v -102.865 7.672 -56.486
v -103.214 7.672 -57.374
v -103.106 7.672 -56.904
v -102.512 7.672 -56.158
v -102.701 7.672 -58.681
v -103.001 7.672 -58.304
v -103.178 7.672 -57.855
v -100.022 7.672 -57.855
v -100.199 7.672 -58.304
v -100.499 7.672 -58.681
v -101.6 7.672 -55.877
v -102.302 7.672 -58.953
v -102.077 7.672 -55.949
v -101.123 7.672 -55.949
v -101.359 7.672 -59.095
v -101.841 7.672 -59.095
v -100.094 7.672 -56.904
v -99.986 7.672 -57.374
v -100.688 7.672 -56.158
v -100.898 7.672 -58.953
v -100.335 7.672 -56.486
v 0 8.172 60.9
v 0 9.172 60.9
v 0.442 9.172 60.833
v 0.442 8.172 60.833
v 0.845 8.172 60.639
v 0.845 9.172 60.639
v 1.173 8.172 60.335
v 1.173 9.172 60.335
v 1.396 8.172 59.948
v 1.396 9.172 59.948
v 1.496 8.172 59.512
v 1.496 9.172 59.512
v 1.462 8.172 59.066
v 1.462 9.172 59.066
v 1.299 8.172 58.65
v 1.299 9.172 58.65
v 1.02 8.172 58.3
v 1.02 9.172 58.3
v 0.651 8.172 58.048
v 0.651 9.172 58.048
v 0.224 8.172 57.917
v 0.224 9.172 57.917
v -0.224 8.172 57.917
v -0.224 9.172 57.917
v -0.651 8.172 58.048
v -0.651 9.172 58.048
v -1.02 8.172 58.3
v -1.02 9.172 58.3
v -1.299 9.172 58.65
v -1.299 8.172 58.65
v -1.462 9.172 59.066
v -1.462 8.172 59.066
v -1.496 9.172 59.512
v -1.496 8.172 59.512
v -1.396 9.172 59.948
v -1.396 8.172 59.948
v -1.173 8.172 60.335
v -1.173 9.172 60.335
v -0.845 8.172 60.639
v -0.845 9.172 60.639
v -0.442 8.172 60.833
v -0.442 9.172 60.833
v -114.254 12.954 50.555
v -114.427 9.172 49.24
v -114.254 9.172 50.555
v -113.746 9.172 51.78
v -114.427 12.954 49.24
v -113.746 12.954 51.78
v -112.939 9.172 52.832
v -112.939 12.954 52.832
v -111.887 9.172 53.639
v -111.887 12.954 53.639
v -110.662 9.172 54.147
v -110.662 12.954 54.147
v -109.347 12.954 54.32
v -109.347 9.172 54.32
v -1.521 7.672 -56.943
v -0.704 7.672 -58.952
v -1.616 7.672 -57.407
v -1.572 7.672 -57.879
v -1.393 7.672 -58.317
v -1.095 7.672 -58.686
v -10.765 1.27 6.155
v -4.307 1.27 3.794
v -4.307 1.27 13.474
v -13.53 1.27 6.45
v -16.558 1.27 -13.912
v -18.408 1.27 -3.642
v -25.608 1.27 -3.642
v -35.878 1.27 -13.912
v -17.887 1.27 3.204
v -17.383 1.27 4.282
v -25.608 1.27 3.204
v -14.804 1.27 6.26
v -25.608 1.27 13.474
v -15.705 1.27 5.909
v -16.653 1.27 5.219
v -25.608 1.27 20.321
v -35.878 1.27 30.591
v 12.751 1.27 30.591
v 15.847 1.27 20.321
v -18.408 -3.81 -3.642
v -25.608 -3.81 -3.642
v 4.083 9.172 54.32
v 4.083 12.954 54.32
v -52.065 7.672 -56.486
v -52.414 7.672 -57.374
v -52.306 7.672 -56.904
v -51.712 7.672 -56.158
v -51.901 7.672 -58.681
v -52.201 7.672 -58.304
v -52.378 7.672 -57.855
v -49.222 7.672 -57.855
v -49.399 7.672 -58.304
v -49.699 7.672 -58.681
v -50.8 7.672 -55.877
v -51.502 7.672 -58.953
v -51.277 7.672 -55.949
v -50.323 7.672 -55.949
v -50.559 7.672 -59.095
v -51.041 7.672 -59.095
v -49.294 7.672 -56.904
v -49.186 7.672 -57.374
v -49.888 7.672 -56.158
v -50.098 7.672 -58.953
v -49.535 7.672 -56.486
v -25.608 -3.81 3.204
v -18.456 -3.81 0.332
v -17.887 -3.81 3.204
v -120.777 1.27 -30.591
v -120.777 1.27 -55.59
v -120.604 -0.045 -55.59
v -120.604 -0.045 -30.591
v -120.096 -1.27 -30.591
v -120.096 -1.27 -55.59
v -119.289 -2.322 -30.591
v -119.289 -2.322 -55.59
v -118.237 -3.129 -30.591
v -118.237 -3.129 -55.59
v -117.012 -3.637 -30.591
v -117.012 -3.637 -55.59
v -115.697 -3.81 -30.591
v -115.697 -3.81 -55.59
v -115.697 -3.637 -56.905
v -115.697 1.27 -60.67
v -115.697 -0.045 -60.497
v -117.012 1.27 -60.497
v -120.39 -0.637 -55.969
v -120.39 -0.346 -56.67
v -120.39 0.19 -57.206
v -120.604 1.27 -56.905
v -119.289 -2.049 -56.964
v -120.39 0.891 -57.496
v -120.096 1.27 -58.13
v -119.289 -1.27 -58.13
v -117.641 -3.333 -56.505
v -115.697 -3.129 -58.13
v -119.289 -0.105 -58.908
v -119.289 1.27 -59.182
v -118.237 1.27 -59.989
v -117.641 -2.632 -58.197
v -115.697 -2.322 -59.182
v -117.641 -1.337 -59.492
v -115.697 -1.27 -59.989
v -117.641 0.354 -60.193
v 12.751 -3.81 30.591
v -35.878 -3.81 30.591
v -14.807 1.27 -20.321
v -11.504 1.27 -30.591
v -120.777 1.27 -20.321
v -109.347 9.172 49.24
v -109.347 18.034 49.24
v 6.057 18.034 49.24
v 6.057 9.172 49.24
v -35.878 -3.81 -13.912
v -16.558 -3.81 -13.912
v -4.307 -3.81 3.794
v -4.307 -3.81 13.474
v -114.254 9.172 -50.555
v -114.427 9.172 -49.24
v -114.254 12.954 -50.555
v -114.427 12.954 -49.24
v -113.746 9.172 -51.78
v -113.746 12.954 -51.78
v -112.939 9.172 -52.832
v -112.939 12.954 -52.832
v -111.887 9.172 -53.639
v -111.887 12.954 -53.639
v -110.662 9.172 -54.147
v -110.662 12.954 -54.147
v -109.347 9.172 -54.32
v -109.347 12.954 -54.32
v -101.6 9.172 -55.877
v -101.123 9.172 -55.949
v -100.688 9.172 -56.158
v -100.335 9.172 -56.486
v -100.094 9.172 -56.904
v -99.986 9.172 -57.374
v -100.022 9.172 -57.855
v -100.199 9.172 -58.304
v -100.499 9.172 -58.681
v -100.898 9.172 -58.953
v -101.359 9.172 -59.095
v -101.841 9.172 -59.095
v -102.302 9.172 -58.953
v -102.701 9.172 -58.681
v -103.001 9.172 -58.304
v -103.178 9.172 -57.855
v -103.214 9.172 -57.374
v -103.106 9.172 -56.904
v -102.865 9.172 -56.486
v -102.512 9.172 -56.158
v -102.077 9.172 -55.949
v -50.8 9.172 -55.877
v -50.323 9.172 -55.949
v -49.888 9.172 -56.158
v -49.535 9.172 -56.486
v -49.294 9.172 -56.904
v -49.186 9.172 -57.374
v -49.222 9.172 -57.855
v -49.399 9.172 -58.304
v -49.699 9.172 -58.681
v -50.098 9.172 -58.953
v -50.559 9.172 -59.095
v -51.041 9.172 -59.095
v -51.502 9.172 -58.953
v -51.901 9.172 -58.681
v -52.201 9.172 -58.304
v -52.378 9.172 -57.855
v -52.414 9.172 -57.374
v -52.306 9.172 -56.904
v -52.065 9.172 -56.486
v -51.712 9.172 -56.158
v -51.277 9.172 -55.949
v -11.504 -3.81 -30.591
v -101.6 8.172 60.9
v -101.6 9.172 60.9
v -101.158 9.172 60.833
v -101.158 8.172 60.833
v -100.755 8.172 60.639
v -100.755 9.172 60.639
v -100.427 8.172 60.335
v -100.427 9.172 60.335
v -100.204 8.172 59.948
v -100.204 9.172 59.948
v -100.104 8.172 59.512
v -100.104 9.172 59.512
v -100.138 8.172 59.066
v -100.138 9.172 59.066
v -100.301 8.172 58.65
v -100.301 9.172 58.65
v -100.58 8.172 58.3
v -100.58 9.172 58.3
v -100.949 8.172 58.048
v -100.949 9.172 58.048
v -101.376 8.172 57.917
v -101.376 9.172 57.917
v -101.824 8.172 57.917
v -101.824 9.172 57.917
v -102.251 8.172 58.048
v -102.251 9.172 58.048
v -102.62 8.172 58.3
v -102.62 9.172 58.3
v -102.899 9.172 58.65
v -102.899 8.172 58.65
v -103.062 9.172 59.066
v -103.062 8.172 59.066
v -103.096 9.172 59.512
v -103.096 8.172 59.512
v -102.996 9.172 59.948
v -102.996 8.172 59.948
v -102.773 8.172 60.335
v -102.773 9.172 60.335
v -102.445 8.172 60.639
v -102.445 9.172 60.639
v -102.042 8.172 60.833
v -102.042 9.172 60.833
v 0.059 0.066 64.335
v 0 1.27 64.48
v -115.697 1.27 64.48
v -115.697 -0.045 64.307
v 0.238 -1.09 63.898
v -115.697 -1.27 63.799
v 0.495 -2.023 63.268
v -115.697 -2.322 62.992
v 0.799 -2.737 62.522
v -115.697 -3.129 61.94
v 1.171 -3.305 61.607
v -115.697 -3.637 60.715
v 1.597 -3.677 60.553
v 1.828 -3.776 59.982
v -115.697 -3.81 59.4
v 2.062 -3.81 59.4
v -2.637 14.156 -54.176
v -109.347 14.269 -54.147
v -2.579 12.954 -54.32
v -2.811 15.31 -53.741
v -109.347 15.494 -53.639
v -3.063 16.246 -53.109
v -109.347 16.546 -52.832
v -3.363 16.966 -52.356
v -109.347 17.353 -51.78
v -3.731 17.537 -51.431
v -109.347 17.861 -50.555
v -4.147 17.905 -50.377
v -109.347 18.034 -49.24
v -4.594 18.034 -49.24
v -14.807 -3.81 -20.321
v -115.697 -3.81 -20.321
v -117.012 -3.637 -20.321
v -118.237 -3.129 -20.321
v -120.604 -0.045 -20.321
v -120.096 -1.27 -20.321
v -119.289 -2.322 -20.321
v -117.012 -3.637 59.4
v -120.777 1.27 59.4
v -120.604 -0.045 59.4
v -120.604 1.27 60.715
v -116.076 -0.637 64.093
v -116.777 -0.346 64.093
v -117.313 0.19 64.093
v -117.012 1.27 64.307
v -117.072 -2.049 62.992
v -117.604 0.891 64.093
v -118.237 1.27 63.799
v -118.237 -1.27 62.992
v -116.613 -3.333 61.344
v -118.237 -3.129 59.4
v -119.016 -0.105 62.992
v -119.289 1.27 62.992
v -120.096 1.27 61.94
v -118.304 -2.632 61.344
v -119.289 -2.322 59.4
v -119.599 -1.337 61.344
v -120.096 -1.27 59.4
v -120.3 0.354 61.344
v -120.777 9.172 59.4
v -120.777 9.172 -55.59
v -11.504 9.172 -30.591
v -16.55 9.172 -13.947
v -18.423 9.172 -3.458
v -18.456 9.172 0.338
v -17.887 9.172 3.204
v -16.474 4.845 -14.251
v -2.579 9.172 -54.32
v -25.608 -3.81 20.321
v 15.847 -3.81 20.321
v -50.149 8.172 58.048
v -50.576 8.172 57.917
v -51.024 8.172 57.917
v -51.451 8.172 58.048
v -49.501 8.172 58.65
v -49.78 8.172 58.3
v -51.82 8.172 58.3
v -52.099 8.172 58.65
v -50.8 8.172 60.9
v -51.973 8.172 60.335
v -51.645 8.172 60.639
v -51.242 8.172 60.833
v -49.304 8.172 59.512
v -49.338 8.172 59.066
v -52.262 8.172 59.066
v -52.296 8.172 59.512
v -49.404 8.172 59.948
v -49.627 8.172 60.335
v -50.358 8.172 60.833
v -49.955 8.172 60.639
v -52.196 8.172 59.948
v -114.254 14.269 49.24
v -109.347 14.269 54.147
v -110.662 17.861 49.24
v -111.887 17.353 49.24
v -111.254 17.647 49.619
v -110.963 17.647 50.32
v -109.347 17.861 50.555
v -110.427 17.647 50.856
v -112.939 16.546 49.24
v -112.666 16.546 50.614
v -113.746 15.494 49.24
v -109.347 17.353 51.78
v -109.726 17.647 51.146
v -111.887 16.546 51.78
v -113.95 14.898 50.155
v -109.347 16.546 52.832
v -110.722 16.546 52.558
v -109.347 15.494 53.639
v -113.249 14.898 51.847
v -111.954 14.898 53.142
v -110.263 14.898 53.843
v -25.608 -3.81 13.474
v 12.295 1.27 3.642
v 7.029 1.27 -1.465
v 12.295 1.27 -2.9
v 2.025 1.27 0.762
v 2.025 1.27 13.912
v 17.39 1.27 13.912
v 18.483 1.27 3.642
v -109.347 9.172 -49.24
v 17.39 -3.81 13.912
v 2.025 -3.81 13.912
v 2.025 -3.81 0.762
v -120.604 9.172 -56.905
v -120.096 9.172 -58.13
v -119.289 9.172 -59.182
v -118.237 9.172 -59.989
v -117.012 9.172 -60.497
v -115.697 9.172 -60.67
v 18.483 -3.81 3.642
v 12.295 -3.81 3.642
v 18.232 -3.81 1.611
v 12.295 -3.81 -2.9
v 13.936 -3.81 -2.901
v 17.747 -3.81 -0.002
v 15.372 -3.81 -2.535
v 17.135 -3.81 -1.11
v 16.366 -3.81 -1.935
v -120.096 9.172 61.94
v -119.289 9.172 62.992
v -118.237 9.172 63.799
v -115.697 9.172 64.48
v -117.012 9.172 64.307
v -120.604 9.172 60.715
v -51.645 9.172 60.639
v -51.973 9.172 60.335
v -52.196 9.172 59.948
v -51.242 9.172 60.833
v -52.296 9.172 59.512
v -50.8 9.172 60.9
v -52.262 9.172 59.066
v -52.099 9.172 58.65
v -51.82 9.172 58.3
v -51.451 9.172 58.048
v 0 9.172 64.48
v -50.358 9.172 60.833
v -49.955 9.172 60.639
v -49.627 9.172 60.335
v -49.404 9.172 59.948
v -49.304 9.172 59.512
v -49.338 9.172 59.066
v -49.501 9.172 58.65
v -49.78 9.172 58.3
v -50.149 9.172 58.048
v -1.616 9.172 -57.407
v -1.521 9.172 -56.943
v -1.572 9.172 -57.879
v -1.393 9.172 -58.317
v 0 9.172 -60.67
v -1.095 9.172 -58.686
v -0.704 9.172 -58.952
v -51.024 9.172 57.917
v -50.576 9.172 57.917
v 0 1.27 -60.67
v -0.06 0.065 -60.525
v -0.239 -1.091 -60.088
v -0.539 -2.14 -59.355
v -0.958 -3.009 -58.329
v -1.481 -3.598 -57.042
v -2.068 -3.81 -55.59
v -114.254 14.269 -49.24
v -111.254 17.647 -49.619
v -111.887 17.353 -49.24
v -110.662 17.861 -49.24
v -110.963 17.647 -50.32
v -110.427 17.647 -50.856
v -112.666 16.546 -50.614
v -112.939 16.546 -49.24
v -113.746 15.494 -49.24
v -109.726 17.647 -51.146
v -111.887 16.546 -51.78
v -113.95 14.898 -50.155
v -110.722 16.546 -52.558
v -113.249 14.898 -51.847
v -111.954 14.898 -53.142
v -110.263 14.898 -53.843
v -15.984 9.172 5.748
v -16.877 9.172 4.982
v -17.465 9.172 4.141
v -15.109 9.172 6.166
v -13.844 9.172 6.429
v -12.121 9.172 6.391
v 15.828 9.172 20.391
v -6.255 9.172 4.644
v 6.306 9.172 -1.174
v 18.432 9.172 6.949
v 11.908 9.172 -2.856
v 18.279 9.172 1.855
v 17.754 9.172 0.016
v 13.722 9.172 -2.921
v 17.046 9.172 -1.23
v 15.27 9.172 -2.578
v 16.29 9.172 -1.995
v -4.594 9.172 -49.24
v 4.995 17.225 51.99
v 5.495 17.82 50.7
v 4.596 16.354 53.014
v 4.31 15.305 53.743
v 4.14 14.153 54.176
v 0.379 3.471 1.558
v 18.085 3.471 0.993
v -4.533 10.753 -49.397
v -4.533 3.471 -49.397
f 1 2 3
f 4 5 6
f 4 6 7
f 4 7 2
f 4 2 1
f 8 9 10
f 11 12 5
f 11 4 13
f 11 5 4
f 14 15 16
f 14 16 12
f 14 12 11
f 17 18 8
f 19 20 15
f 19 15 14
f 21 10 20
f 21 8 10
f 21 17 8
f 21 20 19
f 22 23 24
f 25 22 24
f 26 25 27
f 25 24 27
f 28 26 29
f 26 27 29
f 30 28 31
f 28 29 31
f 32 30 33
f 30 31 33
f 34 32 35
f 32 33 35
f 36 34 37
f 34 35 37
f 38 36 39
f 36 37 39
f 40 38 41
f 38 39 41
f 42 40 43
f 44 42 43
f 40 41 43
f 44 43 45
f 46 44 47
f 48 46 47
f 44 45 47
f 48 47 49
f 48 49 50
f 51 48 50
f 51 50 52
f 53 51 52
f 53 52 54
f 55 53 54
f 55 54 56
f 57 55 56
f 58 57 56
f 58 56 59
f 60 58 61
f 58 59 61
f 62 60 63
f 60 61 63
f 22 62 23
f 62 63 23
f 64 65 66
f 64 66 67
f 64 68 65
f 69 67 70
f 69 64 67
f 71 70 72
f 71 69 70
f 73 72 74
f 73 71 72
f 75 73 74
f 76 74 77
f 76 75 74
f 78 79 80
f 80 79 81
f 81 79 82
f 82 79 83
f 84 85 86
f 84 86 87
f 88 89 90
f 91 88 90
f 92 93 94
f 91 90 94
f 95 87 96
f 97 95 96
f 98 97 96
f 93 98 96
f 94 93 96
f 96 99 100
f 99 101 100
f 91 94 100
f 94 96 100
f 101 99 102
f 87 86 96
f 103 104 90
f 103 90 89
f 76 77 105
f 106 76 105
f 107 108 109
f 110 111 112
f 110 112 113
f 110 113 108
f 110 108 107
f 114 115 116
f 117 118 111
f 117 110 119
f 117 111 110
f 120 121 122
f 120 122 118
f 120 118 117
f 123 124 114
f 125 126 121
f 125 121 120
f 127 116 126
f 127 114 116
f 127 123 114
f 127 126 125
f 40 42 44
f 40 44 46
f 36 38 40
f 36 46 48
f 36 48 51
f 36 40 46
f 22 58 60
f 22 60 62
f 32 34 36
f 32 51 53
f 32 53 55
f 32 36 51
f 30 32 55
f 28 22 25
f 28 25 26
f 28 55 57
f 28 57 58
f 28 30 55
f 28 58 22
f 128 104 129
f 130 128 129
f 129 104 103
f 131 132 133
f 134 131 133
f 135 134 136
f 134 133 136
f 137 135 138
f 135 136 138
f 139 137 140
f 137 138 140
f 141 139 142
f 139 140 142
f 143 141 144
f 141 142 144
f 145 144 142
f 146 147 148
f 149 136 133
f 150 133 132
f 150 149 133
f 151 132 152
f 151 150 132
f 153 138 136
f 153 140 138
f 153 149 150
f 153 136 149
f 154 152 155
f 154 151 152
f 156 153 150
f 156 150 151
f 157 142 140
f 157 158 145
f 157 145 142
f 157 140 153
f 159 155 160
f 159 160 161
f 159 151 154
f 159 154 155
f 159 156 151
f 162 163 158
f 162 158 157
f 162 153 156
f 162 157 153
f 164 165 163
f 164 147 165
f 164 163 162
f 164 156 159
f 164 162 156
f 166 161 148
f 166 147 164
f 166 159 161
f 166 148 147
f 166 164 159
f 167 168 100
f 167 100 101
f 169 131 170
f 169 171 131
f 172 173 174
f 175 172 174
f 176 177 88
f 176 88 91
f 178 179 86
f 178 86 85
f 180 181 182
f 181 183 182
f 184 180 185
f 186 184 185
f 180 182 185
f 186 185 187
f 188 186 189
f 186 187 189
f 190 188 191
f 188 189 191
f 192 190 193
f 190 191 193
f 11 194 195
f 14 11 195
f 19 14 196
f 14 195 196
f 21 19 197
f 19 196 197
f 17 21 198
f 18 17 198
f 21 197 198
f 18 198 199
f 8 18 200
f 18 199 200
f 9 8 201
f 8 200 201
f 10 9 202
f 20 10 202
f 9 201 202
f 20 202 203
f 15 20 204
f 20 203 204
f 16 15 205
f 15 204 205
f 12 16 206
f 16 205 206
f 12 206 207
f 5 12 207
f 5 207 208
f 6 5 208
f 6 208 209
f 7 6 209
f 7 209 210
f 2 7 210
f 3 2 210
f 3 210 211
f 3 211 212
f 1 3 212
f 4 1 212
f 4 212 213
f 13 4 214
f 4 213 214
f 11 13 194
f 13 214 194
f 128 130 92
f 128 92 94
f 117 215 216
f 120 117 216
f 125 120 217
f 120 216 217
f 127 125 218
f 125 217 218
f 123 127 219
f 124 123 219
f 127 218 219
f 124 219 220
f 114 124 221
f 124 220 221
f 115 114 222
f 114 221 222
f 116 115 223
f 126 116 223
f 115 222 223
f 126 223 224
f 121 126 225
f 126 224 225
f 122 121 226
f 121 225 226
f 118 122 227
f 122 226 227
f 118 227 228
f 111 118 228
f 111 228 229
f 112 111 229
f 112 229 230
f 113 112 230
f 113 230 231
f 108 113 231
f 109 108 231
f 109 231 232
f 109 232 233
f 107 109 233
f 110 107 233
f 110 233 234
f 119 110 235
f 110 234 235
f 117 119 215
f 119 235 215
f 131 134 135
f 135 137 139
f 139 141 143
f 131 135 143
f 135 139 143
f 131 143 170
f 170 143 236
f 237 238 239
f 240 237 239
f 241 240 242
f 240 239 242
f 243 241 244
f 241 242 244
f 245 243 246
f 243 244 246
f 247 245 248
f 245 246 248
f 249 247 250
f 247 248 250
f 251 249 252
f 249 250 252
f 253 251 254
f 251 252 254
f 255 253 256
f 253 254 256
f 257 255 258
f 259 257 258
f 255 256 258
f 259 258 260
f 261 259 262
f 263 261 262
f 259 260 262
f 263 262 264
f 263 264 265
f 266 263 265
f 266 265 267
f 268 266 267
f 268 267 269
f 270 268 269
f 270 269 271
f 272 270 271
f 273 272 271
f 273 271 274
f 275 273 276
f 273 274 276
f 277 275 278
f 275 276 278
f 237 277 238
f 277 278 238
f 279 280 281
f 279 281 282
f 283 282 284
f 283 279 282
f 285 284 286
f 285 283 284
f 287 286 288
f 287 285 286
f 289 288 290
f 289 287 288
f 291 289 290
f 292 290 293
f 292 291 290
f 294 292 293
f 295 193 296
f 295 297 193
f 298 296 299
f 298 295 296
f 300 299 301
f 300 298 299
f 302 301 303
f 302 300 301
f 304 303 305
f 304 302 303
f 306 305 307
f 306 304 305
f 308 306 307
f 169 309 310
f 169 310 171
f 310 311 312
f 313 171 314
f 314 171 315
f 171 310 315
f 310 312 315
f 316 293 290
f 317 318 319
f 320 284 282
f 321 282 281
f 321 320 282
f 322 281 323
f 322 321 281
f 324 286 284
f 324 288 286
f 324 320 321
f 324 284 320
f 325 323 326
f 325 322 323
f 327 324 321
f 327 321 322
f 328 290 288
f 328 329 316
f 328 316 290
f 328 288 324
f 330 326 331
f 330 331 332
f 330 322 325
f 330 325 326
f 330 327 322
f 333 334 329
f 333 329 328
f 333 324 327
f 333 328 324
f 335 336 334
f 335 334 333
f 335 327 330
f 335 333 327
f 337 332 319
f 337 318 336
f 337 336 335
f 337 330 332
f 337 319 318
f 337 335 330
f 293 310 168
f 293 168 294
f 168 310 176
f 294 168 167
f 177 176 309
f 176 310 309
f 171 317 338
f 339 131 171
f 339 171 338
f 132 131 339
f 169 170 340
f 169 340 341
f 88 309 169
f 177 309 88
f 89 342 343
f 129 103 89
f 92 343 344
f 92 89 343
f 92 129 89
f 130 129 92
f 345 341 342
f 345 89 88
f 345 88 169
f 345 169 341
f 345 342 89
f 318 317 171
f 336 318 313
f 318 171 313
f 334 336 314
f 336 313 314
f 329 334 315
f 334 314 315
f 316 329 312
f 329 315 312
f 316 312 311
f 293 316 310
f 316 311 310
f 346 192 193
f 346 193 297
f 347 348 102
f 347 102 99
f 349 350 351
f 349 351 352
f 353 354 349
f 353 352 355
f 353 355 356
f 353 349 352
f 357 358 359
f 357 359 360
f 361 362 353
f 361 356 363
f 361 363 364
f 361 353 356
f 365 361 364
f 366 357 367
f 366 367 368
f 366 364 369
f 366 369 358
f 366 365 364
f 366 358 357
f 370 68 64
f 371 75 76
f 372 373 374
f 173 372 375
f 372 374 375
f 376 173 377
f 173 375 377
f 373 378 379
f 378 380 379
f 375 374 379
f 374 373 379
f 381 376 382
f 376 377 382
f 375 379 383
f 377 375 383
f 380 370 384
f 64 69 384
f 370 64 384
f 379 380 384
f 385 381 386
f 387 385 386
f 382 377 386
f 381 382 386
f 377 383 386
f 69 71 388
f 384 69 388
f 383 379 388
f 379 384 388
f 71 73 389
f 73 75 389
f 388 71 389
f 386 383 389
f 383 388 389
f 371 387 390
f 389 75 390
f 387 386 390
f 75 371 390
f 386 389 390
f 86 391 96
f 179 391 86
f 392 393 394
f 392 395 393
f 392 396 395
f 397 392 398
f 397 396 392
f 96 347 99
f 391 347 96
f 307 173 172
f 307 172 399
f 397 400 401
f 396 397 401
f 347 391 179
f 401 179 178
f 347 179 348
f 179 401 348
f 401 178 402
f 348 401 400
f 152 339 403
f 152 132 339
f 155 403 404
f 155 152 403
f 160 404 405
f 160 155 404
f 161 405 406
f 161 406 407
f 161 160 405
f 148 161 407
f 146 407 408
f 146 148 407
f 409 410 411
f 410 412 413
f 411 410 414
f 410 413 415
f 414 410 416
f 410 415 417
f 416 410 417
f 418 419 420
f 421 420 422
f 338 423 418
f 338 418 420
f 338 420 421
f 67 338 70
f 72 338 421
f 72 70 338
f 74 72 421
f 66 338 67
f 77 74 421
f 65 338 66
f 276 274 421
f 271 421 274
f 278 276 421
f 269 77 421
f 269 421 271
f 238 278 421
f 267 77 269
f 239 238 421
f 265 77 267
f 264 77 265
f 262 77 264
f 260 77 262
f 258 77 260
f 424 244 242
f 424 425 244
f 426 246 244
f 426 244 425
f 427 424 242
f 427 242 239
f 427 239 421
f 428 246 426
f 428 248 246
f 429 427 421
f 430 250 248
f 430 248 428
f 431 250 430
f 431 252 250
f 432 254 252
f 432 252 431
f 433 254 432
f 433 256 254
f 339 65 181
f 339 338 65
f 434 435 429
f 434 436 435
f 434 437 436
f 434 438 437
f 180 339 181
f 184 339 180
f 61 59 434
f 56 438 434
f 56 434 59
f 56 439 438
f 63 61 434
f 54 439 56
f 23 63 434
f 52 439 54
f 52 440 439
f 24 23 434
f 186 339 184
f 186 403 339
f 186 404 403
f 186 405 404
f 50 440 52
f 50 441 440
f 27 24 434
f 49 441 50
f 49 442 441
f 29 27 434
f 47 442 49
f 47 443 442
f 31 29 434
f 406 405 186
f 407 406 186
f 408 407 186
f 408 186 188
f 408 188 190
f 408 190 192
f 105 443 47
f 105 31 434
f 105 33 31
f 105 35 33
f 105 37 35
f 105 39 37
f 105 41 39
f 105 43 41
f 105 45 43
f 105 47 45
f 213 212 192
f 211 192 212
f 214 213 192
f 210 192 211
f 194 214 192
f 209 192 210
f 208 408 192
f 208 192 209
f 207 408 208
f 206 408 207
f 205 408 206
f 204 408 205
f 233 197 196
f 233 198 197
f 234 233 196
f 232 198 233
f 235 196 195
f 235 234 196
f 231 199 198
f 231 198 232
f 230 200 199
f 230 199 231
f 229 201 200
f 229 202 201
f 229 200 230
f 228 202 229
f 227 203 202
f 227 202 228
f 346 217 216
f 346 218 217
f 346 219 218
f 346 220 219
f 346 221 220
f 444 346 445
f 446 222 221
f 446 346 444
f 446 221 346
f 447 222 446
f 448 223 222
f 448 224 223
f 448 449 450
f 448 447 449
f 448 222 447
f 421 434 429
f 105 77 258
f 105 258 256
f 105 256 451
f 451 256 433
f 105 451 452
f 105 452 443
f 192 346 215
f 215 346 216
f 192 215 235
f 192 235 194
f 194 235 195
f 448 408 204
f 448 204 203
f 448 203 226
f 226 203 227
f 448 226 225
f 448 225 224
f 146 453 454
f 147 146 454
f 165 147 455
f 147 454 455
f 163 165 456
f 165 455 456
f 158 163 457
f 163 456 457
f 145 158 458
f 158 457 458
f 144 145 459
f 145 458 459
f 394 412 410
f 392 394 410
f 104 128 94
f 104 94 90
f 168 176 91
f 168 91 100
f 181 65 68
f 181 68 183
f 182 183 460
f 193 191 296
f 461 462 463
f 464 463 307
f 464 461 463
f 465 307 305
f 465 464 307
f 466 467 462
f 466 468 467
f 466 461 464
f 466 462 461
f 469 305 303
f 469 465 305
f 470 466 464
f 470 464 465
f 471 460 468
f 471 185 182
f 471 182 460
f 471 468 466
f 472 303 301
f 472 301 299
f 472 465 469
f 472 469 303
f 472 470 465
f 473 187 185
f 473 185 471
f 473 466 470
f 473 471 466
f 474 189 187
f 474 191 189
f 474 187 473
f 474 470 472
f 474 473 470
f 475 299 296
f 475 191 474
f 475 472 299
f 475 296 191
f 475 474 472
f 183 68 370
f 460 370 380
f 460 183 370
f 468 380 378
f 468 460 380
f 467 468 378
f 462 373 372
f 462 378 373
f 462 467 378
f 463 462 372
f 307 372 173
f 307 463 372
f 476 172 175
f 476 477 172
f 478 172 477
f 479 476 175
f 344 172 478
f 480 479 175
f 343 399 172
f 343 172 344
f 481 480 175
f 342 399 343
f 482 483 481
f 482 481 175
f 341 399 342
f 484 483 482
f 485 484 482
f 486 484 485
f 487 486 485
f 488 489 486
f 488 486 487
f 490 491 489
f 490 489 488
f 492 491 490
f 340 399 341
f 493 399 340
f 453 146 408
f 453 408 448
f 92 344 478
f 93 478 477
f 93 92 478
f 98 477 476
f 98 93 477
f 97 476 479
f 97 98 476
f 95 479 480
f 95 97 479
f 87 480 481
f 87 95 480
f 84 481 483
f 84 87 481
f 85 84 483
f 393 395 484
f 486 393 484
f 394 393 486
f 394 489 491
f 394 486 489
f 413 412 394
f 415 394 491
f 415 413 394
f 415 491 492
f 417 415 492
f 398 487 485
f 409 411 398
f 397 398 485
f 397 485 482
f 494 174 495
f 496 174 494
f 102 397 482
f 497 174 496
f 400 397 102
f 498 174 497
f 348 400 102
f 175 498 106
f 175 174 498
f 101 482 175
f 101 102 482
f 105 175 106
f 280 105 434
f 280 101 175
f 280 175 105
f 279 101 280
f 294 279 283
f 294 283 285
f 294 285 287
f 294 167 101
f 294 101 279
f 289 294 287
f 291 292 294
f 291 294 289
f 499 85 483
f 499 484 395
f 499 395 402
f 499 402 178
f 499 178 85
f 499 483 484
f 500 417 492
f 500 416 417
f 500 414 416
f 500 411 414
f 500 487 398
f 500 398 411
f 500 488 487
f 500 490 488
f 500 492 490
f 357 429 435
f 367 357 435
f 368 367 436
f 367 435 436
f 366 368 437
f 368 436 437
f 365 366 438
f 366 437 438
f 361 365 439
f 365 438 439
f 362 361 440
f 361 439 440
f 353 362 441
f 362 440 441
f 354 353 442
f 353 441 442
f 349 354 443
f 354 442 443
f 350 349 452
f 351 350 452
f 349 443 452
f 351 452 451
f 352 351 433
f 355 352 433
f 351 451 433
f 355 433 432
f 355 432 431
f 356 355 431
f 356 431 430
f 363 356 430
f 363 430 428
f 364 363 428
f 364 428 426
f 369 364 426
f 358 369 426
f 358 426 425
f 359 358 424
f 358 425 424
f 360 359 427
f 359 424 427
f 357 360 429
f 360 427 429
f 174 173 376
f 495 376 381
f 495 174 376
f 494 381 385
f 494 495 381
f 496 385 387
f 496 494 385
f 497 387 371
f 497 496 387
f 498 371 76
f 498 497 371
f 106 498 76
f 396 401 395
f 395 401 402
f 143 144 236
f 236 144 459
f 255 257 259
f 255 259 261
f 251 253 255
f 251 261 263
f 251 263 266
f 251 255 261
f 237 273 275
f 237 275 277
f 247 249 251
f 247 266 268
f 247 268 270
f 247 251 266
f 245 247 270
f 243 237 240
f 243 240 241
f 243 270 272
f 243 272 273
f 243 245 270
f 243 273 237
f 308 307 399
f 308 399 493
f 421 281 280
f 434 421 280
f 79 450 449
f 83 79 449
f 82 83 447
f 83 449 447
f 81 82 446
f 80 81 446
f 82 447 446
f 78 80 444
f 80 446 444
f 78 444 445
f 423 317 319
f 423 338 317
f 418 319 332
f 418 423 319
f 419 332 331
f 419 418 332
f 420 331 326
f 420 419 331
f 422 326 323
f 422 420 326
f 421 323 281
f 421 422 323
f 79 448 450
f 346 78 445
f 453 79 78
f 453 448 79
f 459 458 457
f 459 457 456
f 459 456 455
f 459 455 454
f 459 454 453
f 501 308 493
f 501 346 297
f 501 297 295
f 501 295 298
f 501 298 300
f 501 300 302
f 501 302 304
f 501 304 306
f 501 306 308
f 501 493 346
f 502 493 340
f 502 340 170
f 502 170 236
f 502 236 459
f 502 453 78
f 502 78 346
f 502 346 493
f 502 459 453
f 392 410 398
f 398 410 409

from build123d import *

# Parameters (mm, degrees)
SKETCH1_14_W         = 241.554
SKETCH1_14_H         = 125.149549896
BOSS_EXTRUDE9_DEPTH  = 3.81
SKETCH1_W            = 241.554
SKETCH1_H            = 125.149549896
SKETCH1_W_2          = 228.854
SKETCH1_H_2          = 108.639549896
BOSS_EXTRUDE10_DEPTH = 9.171821007
SKETCH29_R           = 1.61811024
CUT_EXTRUDE12_DEPTH  = 1.5
LPATTERN24_COUNT     = 3
LPATTERN24_PITCH     = 50.8
LPATTERN25_COUNT     = 3
LPATTERN25_PITCH     = 50.8
SKETCH30_R           = 1.5
CUT_EXTRUDE13_DEPTH  = 1
LPATTERN26_COUNT     = 3
LPATTERN26_PITCH     = 50.8
LPATTERN27_COUNT     = 3
LPATTERN27_PITCH     = 50.8
SKETCH37_W           = 228.854
SKETCH37_H           = 108.639549896
BOSS_EXTRUDE12_DEPTH = 18.034
FILLET7_R            = 5.08
SKETCH38_W           = 218.694
SKETCH38_H           = 98.479549896
CUT_EXTRUDE14_DEPTH  = 8.862178993
CUT_EXTRUDE15_DEPTH  = 5.08
SURFACECUT1_START    = -3.81
SURFACECUT1_DEPTH    = 21.844


# Read off the part's stored shape, not the designer's step: SurfaceCut1
with BuildPart() as part:
    # Sketch1<14> → Boss-Extrude9 (new body)
    with BuildSketch(Plane(origin=(0, 0, 0), x_dir=(1, 0, 0), z_dir=(0, 1, 0))):
        with Locations((0, -1.905)):
            Rectangle(SKETCH1_14_W, SKETCH1_14_H)
    extrude(amount=-BOSS_EXTRUDE9_DEPTH)

    # Sketch1 → Boss-Extrude10 (add)
    with BuildSketch(Plane(origin=(0, 0, 0), x_dir=(1, 0, 0), z_dir=(0, 1, 0))):
        with Locations((0, -1.905)):
            Rectangle(SKETCH1_W, SKETCH1_H)
        Rectangle(SKETCH1_W_2, SKETCH1_H_2, mode=Mode.SUBTRACT)
    extrude(amount=BOSS_EXTRUDE10_DEPTH)

    # Sketch29 → Cut-Extrude12 (cut)
    with BuildSketch(Plane(origin=(0, 9.171821007, 0), x_dir=(1, 0, 0), z_dir=(0, 1, 0))):
        with Locations(Location((0, 57.494774948, 0), (0, 0, 270))):
            Circle(SKETCH29_R)
    cut_extrude12 = extrude(amount=-CUT_EXTRUDE12_DEPTH, mode=Mode.SUBTRACT)

    # LPattern24: Cut-Extrude12 ×3
    with Locations(*[(-i * LPATTERN24_PITCH, 0, 0) for i in range(1, LPATTERN24_COUNT)]):
        add(cut_extrude12, mode=Mode.SUBTRACT)

    # LPattern25: Cut-Extrude12 ×3
    with Locations(*[(i * LPATTERN25_PITCH, 0, 0) for i in range(1, LPATTERN25_COUNT)]):
        add(cut_extrude12, mode=Mode.SUBTRACT)

    # Sketch30 → Cut-Extrude13 (cut)
    with BuildSketch(Plane(origin=(0, 9.171821007, 0), x_dir=(1, 0, 0), z_dir=(0, 1, 0))):
        with Locations(Location((0, -59.399774948, 0), (0, 0, 270))):
            Circle(SKETCH30_R)
    cut_extrude13 = extrude(amount=-CUT_EXTRUDE13_DEPTH, mode=Mode.SUBTRACT)

    # LPattern26: Cut-Extrude13 ×3
    with Locations(*[(i * LPATTERN26_PITCH, 0, 0) for i in range(1, LPATTERN26_COUNT)]):
        add(cut_extrude13, mode=Mode.SUBTRACT)

    # LPattern27: Cut-Extrude13 ×3
    with Locations(*[(-i * LPATTERN27_PITCH, 0, 0) for i in range(1, LPATTERN27_COUNT)]):
        add(cut_extrude13, mode=Mode.SUBTRACT)

    # Sketch37 → Boss-Extrude12 (add)
    with BuildSketch(Plane(origin=(0, 0, 0), x_dir=(1, 0, 0), z_dir=(0, 1, 0))):
        Rectangle(SKETCH37_W, SKETCH37_H)
    extrude(amount=BOSS_EXTRUDE12_DEPTH)

    # Fillet7
    fillet7_edges = [part.edges().sort_by_distance(p)[0] for p in [
        (120.777, -3.81, 1.905),
        (0, -3.81, -60.669774948),
        (-120.777, -3.81, 1.905),
        (0, -3.81, 64.479774948),
        (-120.777, 2.680910504, -60.669774948),
        (-114.427, 13.602910504, -54.319774948),
        (120.777, 2.680910504, -60.669774948),
        (-114.427, 13.602910504, 54.319774948),
        (114.427, 13.602910504, 54.319774948),
        (114.427, 13.602910504, -54.319774948),
        (-114.427, 18.034, 0),
        (0, 18.034, 54.319774948),
        (114.427, 18.034, 0),
        (120.777, 2.680910504, 64.479774948),
        (0, 18.034, -54.319774948),
        (-120.777, 2.680910504, 64.479774948),
    ]]
    fillet(fillet7_edges, radius=FILLET7_R)

    # Sketch38 → Cut-Extrude14 (cut)
    with BuildSketch(Plane(origin=(0, 18.034, 0), x_dir=(1, 0, 0), z_dir=(0, 1, 0))):
        Rectangle(SKETCH38_W, SKETCH38_H)
    extrude(amount=-CUT_EXTRUDE14_DEPTH, mode=Mode.SUBTRACT)

    # Sketch40 → Cut-Extrude15 (cut)
    with BuildSketch(Plane.XZ.offset(3.81)):
        Polygon((-35.878101968, 30.590802731), (120.777, 30.590802731), (120.777, 20.320819759), (-25.608118996, 20.320819759), (-25.608118996, 13.474164444), (-4.307413572, 13.474164444), (-4.307413572, 3.204181472), (-25.608118996, 3.204181472), (-25.608118996, -3.642473843), (-4.307413572, -3.642473843), (-4.307413572, -13.912456815), (-35.878101968, -13.912456815), align=None)
        Polygon((35.878101968, -3.204181472), (12.295330254, -3.204181472), (12.295330254, 3.642473843), (35.878101968, 3.642473843), (35.878101968, 13.912456815), (2.025195134, 13.912456815), (2.025195134, -13.474164444), (25.608118996, -13.474164444), (25.608118996, -20.320667611), (-120.777, -20.320667611), (-120.777, -30.590802731), (35.878101968, -30.590802731), align=None)
    extrude(amount=-CUT_EXTRUDE15_DEPTH, mode=Mode.SUBTRACT)

    # SurfaceCut1 outline → SurfaceCut1 (cut)
    with BuildSketch(Plane(origin=(0, 0, 0), x_dir=(1, 0, 0), z_dir=(0, 1, 0)).offset(SURFACECUT1_START)):
        with BuildLine():
            Line((0, -64.479774948), (115.697, -64.479774948))
            ThreePointArc((115.697, -64.479774948), (119.289102448, -62.991877396), (120.777, -59.399774948))
            Line((120.777, -59.399774948), (120.777, 55.589774948))
            ThreePointArc((120.777, 55.589774948), (119.289102448, 59.181877396), (115.697, 60.669774948))
            Line((115.697, 60.669774948), (0, 60.669774948))
            add(Edge.make_bspline(
                [(0, 60.669774948), (-4.900958952, 48.738988323), (-8.678459932, 38.81495371), (-11.504191584, 30.590802731)],
                knots=[0.996302642, 0.996302642, 0.996302642, 0.996302642, 1.072713483, 1.072713483, 1.072713483, 1.072713483], degree=3))
            add(Edge.make_bspline(
                [(-11.504191584, 30.590802731), (-18.142241768, 11.271088885), (-19.527974886, 1.332143628), (-17.887110358, -3.204181472)],
                knots=[0.888553663, 0.888553663, 0.888553663, 0.888553663, 1.068053721, 1.068053721, 1.068053721, 1.068053721], degree=3))
            add(Edge.make_bspline(
                [(-17.887110358, -3.204181472), (-11.085165947, -22.008799781), (47.725405996, 52.02444551), (0, -64.479774948)],
                knots=[0.478911773, 0.478911773, 0.478911773, 0.478911773, 1.223000875, 1.223000875, 1.223000875, 1.223000875], degree=3))
        make_face()
    extrude(amount=SURFACECUT1_DEPTH, mode=Mode.SUBTRACT)


solid = part.part
